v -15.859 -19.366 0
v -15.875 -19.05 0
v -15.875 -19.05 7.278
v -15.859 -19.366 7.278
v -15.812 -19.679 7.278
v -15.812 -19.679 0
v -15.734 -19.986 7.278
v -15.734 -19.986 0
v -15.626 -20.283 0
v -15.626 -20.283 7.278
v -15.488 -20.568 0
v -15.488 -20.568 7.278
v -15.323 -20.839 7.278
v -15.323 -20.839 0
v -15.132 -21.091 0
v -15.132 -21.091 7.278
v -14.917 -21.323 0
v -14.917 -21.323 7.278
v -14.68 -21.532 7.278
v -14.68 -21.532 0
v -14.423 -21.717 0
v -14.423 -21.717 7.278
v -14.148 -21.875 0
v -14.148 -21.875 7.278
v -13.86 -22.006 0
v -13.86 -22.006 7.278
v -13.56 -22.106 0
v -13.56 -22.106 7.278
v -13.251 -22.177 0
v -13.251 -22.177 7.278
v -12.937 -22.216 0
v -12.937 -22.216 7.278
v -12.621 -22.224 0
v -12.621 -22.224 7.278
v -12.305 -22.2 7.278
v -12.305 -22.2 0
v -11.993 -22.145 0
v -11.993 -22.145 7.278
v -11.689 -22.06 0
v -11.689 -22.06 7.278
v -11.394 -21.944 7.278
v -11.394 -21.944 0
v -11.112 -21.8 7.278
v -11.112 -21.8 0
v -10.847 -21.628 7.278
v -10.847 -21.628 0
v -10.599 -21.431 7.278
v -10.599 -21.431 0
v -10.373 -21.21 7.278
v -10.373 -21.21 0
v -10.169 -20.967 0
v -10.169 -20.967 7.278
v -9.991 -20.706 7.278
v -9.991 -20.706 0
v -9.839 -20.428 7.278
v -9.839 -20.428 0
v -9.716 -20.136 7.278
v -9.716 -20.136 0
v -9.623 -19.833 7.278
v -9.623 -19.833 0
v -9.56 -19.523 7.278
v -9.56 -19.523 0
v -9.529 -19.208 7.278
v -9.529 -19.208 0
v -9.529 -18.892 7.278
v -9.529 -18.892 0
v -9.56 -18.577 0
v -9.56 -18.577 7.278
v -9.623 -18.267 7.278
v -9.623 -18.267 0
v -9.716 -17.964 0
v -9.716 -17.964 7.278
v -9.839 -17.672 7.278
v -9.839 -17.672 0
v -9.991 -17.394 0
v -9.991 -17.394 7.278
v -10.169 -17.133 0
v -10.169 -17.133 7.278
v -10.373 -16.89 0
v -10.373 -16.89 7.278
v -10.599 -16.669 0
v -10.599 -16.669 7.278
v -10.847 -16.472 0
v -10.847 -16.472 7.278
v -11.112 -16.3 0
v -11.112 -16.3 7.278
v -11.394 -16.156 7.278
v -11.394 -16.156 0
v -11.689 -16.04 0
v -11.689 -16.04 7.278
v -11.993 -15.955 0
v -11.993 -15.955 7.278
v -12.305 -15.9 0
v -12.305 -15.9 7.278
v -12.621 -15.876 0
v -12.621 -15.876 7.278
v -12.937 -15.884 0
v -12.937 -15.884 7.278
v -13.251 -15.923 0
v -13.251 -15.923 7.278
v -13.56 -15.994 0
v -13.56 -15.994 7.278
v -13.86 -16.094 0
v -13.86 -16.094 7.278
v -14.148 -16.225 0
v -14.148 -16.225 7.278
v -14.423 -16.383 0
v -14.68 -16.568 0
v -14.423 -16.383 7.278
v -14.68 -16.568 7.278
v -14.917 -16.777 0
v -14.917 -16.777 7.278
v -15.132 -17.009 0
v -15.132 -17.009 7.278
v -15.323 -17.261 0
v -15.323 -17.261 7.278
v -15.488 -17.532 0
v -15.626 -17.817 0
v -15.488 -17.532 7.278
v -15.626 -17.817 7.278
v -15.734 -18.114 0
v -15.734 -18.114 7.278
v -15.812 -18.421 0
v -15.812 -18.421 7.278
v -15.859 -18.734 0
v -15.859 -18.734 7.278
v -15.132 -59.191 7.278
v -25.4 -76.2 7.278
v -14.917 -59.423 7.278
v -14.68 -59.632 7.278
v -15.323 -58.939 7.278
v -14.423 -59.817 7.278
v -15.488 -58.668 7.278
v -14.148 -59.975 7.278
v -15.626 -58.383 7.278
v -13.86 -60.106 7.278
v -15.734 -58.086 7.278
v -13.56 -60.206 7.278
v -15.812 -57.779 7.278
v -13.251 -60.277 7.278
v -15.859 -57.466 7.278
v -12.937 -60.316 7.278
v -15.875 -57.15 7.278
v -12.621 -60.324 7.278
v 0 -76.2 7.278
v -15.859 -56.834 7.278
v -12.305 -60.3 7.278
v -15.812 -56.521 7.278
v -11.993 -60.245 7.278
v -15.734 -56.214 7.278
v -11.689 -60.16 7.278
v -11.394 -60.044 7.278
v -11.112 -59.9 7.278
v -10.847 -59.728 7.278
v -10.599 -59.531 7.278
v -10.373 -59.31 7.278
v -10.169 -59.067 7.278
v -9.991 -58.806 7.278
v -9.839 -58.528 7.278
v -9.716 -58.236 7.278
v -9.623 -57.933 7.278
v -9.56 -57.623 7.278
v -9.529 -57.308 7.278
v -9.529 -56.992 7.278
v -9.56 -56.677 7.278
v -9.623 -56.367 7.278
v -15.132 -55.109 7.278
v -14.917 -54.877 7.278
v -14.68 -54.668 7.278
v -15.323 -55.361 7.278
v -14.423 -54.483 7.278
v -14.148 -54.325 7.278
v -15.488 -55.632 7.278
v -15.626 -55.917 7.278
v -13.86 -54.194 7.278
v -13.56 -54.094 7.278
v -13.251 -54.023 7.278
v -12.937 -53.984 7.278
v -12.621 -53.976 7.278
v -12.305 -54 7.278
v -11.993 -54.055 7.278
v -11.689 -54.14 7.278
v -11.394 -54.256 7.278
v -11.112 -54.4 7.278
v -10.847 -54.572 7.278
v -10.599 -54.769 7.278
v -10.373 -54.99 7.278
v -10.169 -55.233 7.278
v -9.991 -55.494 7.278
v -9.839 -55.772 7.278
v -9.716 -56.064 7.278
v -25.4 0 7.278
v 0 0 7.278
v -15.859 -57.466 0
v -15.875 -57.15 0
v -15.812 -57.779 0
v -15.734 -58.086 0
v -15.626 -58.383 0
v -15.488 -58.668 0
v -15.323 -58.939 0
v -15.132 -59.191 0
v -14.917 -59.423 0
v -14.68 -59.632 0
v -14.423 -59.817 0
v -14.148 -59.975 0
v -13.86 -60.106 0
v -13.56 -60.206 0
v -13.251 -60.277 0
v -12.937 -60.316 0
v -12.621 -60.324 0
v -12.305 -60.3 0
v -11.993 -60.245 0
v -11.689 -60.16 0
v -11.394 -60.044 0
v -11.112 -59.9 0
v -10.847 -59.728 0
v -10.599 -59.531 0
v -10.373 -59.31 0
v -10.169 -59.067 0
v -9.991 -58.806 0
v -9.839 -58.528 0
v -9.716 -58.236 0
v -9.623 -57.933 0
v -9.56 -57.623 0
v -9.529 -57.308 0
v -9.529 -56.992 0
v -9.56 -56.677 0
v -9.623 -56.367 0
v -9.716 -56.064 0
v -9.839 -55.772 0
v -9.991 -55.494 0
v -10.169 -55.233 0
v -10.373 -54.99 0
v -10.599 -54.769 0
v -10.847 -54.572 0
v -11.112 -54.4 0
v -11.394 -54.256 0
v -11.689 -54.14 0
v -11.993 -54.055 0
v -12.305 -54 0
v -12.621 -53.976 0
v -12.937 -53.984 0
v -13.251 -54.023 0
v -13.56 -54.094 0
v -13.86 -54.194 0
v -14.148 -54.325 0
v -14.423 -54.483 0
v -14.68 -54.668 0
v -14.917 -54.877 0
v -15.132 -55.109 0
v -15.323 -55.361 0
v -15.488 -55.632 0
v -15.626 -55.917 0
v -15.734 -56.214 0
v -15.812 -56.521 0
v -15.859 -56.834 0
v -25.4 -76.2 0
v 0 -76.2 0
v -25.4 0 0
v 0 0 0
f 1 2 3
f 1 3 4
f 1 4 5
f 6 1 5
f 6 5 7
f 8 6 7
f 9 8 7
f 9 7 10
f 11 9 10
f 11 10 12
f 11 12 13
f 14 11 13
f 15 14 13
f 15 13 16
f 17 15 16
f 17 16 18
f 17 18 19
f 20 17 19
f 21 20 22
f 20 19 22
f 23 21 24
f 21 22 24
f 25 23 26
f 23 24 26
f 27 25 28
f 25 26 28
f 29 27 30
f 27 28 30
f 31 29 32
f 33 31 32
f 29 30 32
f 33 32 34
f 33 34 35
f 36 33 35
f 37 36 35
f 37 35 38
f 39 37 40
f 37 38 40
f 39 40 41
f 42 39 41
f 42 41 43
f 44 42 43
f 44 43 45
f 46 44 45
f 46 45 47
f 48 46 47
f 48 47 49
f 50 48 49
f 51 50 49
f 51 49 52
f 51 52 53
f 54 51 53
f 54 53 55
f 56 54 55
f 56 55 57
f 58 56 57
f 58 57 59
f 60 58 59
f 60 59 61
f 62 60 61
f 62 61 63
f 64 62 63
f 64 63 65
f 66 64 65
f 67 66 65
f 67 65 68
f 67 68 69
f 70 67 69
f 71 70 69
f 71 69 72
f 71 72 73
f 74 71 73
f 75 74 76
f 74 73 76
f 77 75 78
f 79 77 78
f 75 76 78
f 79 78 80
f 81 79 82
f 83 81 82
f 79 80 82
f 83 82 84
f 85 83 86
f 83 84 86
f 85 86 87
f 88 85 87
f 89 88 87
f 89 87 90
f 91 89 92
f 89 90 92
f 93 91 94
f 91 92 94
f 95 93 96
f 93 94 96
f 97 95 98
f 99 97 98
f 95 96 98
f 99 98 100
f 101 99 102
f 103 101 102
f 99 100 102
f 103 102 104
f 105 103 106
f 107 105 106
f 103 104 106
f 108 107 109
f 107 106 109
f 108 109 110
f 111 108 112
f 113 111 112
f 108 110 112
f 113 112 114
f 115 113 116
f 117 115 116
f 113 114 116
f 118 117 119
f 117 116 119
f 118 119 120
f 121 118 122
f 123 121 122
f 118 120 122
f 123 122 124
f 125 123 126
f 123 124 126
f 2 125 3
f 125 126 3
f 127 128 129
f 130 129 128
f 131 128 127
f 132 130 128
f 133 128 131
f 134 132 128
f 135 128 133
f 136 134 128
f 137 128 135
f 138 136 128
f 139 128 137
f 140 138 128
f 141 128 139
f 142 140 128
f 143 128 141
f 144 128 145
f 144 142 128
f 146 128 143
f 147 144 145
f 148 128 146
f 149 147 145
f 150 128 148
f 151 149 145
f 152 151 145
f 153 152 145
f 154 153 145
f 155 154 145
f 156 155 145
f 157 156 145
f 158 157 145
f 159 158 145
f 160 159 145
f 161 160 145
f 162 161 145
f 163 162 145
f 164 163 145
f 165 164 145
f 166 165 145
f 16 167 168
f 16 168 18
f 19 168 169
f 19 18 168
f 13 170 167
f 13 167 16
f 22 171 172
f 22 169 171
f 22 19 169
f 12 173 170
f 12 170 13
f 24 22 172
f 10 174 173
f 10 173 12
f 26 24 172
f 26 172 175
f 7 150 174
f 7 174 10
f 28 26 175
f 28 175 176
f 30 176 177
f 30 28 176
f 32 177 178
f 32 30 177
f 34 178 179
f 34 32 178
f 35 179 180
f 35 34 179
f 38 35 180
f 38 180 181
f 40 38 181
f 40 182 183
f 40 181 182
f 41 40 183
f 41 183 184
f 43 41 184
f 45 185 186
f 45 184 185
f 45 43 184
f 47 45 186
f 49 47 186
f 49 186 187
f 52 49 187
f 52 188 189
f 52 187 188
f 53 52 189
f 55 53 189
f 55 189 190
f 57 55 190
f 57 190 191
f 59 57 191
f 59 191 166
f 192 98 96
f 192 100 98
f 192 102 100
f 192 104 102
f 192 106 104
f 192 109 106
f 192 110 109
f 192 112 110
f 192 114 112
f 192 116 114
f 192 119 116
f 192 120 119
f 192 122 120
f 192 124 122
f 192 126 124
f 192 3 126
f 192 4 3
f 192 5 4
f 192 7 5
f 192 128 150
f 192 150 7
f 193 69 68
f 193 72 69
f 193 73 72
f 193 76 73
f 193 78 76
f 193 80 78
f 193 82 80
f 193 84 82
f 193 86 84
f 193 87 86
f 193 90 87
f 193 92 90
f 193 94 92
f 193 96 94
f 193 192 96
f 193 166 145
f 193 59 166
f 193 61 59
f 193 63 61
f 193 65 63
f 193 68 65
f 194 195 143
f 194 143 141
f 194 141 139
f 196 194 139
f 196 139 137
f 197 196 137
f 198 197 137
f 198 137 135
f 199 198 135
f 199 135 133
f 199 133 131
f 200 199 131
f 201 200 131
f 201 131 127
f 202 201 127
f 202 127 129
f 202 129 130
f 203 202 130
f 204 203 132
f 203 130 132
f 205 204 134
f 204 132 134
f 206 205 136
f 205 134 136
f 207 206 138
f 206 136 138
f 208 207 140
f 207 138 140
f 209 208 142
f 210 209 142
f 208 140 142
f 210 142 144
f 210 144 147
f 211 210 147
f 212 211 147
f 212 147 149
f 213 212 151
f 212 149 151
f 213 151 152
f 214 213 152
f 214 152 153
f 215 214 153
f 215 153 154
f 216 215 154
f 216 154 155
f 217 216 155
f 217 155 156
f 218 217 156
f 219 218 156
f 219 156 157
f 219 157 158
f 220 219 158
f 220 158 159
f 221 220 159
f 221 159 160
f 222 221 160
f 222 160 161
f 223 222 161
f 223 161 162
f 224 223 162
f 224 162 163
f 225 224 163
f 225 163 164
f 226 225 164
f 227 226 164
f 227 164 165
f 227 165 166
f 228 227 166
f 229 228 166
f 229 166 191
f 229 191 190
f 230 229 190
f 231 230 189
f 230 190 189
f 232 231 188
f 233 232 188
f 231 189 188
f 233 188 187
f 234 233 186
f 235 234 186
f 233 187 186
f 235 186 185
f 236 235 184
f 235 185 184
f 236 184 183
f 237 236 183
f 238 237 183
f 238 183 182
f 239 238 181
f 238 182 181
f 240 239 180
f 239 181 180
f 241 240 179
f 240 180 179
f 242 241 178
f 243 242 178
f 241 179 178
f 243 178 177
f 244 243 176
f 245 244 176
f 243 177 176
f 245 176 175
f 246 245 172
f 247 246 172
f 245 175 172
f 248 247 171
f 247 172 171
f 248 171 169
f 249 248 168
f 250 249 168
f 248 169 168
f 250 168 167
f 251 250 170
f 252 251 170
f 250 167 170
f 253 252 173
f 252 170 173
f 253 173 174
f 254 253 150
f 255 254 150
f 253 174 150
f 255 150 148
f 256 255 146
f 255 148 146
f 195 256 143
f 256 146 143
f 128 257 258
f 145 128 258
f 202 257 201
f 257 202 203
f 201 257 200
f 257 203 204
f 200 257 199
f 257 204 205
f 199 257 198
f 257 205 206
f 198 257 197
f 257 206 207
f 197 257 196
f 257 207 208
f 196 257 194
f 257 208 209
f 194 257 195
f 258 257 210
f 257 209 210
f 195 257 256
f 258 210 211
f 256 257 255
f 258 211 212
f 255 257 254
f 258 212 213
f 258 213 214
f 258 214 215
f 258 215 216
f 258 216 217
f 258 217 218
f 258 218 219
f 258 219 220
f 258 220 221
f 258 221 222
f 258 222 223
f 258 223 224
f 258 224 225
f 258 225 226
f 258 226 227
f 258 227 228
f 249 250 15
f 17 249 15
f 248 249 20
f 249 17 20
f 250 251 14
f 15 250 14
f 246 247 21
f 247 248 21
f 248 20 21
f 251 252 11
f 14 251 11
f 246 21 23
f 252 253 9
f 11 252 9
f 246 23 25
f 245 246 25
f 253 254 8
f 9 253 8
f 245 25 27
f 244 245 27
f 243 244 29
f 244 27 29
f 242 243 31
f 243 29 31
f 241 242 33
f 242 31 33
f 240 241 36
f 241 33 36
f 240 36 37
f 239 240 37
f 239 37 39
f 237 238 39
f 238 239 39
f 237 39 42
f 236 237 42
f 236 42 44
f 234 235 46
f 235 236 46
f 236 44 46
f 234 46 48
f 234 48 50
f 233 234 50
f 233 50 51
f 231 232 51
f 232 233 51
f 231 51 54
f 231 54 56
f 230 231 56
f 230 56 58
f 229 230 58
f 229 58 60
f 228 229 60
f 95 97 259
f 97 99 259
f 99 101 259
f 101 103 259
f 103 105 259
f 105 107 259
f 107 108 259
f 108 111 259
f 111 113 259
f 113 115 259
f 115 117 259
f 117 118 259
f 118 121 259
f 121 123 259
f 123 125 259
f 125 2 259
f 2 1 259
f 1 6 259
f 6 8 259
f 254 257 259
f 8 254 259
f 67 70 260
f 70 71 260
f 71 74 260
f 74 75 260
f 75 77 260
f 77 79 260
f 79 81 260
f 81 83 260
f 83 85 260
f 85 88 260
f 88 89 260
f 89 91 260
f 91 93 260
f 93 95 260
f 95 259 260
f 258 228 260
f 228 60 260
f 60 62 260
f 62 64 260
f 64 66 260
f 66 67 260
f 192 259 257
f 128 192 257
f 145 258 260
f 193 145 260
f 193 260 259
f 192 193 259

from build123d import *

# Parameters (mm, degrees)
F1_DEPTH = 7.27782
F3_D     = 6.35
F5_D     = 6.35


with BuildPart() as f1:
    # F0 (on Top) → F1 (new body)
    with BuildSketch(Plane.XY):
        Polygon((0, -76.2), (0, 0), (-12.7, 0), (-25.4, 0), (-25.4, -76.2), (-12.7, -76.2), align=None)
    extrude(amount=F1_DEPTH)

    # F3 (through all)
    with Locations(Plane(origin=(0, 0, 0), x_dir=(1, 0, 0), z_dir=(0, 0, -1))):
        with Locations((-12.7, 57.15)):
            Hole(F3_D / 2)

    # F5 (through all)
    with Locations(Plane(origin=(0, 0, 0), x_dir=(1, 0, 0), z_dir=(0, 0, -1))):
        with Locations((-12.7, 19.05)):
            Hole(F5_D / 2)


solid = f1.part
